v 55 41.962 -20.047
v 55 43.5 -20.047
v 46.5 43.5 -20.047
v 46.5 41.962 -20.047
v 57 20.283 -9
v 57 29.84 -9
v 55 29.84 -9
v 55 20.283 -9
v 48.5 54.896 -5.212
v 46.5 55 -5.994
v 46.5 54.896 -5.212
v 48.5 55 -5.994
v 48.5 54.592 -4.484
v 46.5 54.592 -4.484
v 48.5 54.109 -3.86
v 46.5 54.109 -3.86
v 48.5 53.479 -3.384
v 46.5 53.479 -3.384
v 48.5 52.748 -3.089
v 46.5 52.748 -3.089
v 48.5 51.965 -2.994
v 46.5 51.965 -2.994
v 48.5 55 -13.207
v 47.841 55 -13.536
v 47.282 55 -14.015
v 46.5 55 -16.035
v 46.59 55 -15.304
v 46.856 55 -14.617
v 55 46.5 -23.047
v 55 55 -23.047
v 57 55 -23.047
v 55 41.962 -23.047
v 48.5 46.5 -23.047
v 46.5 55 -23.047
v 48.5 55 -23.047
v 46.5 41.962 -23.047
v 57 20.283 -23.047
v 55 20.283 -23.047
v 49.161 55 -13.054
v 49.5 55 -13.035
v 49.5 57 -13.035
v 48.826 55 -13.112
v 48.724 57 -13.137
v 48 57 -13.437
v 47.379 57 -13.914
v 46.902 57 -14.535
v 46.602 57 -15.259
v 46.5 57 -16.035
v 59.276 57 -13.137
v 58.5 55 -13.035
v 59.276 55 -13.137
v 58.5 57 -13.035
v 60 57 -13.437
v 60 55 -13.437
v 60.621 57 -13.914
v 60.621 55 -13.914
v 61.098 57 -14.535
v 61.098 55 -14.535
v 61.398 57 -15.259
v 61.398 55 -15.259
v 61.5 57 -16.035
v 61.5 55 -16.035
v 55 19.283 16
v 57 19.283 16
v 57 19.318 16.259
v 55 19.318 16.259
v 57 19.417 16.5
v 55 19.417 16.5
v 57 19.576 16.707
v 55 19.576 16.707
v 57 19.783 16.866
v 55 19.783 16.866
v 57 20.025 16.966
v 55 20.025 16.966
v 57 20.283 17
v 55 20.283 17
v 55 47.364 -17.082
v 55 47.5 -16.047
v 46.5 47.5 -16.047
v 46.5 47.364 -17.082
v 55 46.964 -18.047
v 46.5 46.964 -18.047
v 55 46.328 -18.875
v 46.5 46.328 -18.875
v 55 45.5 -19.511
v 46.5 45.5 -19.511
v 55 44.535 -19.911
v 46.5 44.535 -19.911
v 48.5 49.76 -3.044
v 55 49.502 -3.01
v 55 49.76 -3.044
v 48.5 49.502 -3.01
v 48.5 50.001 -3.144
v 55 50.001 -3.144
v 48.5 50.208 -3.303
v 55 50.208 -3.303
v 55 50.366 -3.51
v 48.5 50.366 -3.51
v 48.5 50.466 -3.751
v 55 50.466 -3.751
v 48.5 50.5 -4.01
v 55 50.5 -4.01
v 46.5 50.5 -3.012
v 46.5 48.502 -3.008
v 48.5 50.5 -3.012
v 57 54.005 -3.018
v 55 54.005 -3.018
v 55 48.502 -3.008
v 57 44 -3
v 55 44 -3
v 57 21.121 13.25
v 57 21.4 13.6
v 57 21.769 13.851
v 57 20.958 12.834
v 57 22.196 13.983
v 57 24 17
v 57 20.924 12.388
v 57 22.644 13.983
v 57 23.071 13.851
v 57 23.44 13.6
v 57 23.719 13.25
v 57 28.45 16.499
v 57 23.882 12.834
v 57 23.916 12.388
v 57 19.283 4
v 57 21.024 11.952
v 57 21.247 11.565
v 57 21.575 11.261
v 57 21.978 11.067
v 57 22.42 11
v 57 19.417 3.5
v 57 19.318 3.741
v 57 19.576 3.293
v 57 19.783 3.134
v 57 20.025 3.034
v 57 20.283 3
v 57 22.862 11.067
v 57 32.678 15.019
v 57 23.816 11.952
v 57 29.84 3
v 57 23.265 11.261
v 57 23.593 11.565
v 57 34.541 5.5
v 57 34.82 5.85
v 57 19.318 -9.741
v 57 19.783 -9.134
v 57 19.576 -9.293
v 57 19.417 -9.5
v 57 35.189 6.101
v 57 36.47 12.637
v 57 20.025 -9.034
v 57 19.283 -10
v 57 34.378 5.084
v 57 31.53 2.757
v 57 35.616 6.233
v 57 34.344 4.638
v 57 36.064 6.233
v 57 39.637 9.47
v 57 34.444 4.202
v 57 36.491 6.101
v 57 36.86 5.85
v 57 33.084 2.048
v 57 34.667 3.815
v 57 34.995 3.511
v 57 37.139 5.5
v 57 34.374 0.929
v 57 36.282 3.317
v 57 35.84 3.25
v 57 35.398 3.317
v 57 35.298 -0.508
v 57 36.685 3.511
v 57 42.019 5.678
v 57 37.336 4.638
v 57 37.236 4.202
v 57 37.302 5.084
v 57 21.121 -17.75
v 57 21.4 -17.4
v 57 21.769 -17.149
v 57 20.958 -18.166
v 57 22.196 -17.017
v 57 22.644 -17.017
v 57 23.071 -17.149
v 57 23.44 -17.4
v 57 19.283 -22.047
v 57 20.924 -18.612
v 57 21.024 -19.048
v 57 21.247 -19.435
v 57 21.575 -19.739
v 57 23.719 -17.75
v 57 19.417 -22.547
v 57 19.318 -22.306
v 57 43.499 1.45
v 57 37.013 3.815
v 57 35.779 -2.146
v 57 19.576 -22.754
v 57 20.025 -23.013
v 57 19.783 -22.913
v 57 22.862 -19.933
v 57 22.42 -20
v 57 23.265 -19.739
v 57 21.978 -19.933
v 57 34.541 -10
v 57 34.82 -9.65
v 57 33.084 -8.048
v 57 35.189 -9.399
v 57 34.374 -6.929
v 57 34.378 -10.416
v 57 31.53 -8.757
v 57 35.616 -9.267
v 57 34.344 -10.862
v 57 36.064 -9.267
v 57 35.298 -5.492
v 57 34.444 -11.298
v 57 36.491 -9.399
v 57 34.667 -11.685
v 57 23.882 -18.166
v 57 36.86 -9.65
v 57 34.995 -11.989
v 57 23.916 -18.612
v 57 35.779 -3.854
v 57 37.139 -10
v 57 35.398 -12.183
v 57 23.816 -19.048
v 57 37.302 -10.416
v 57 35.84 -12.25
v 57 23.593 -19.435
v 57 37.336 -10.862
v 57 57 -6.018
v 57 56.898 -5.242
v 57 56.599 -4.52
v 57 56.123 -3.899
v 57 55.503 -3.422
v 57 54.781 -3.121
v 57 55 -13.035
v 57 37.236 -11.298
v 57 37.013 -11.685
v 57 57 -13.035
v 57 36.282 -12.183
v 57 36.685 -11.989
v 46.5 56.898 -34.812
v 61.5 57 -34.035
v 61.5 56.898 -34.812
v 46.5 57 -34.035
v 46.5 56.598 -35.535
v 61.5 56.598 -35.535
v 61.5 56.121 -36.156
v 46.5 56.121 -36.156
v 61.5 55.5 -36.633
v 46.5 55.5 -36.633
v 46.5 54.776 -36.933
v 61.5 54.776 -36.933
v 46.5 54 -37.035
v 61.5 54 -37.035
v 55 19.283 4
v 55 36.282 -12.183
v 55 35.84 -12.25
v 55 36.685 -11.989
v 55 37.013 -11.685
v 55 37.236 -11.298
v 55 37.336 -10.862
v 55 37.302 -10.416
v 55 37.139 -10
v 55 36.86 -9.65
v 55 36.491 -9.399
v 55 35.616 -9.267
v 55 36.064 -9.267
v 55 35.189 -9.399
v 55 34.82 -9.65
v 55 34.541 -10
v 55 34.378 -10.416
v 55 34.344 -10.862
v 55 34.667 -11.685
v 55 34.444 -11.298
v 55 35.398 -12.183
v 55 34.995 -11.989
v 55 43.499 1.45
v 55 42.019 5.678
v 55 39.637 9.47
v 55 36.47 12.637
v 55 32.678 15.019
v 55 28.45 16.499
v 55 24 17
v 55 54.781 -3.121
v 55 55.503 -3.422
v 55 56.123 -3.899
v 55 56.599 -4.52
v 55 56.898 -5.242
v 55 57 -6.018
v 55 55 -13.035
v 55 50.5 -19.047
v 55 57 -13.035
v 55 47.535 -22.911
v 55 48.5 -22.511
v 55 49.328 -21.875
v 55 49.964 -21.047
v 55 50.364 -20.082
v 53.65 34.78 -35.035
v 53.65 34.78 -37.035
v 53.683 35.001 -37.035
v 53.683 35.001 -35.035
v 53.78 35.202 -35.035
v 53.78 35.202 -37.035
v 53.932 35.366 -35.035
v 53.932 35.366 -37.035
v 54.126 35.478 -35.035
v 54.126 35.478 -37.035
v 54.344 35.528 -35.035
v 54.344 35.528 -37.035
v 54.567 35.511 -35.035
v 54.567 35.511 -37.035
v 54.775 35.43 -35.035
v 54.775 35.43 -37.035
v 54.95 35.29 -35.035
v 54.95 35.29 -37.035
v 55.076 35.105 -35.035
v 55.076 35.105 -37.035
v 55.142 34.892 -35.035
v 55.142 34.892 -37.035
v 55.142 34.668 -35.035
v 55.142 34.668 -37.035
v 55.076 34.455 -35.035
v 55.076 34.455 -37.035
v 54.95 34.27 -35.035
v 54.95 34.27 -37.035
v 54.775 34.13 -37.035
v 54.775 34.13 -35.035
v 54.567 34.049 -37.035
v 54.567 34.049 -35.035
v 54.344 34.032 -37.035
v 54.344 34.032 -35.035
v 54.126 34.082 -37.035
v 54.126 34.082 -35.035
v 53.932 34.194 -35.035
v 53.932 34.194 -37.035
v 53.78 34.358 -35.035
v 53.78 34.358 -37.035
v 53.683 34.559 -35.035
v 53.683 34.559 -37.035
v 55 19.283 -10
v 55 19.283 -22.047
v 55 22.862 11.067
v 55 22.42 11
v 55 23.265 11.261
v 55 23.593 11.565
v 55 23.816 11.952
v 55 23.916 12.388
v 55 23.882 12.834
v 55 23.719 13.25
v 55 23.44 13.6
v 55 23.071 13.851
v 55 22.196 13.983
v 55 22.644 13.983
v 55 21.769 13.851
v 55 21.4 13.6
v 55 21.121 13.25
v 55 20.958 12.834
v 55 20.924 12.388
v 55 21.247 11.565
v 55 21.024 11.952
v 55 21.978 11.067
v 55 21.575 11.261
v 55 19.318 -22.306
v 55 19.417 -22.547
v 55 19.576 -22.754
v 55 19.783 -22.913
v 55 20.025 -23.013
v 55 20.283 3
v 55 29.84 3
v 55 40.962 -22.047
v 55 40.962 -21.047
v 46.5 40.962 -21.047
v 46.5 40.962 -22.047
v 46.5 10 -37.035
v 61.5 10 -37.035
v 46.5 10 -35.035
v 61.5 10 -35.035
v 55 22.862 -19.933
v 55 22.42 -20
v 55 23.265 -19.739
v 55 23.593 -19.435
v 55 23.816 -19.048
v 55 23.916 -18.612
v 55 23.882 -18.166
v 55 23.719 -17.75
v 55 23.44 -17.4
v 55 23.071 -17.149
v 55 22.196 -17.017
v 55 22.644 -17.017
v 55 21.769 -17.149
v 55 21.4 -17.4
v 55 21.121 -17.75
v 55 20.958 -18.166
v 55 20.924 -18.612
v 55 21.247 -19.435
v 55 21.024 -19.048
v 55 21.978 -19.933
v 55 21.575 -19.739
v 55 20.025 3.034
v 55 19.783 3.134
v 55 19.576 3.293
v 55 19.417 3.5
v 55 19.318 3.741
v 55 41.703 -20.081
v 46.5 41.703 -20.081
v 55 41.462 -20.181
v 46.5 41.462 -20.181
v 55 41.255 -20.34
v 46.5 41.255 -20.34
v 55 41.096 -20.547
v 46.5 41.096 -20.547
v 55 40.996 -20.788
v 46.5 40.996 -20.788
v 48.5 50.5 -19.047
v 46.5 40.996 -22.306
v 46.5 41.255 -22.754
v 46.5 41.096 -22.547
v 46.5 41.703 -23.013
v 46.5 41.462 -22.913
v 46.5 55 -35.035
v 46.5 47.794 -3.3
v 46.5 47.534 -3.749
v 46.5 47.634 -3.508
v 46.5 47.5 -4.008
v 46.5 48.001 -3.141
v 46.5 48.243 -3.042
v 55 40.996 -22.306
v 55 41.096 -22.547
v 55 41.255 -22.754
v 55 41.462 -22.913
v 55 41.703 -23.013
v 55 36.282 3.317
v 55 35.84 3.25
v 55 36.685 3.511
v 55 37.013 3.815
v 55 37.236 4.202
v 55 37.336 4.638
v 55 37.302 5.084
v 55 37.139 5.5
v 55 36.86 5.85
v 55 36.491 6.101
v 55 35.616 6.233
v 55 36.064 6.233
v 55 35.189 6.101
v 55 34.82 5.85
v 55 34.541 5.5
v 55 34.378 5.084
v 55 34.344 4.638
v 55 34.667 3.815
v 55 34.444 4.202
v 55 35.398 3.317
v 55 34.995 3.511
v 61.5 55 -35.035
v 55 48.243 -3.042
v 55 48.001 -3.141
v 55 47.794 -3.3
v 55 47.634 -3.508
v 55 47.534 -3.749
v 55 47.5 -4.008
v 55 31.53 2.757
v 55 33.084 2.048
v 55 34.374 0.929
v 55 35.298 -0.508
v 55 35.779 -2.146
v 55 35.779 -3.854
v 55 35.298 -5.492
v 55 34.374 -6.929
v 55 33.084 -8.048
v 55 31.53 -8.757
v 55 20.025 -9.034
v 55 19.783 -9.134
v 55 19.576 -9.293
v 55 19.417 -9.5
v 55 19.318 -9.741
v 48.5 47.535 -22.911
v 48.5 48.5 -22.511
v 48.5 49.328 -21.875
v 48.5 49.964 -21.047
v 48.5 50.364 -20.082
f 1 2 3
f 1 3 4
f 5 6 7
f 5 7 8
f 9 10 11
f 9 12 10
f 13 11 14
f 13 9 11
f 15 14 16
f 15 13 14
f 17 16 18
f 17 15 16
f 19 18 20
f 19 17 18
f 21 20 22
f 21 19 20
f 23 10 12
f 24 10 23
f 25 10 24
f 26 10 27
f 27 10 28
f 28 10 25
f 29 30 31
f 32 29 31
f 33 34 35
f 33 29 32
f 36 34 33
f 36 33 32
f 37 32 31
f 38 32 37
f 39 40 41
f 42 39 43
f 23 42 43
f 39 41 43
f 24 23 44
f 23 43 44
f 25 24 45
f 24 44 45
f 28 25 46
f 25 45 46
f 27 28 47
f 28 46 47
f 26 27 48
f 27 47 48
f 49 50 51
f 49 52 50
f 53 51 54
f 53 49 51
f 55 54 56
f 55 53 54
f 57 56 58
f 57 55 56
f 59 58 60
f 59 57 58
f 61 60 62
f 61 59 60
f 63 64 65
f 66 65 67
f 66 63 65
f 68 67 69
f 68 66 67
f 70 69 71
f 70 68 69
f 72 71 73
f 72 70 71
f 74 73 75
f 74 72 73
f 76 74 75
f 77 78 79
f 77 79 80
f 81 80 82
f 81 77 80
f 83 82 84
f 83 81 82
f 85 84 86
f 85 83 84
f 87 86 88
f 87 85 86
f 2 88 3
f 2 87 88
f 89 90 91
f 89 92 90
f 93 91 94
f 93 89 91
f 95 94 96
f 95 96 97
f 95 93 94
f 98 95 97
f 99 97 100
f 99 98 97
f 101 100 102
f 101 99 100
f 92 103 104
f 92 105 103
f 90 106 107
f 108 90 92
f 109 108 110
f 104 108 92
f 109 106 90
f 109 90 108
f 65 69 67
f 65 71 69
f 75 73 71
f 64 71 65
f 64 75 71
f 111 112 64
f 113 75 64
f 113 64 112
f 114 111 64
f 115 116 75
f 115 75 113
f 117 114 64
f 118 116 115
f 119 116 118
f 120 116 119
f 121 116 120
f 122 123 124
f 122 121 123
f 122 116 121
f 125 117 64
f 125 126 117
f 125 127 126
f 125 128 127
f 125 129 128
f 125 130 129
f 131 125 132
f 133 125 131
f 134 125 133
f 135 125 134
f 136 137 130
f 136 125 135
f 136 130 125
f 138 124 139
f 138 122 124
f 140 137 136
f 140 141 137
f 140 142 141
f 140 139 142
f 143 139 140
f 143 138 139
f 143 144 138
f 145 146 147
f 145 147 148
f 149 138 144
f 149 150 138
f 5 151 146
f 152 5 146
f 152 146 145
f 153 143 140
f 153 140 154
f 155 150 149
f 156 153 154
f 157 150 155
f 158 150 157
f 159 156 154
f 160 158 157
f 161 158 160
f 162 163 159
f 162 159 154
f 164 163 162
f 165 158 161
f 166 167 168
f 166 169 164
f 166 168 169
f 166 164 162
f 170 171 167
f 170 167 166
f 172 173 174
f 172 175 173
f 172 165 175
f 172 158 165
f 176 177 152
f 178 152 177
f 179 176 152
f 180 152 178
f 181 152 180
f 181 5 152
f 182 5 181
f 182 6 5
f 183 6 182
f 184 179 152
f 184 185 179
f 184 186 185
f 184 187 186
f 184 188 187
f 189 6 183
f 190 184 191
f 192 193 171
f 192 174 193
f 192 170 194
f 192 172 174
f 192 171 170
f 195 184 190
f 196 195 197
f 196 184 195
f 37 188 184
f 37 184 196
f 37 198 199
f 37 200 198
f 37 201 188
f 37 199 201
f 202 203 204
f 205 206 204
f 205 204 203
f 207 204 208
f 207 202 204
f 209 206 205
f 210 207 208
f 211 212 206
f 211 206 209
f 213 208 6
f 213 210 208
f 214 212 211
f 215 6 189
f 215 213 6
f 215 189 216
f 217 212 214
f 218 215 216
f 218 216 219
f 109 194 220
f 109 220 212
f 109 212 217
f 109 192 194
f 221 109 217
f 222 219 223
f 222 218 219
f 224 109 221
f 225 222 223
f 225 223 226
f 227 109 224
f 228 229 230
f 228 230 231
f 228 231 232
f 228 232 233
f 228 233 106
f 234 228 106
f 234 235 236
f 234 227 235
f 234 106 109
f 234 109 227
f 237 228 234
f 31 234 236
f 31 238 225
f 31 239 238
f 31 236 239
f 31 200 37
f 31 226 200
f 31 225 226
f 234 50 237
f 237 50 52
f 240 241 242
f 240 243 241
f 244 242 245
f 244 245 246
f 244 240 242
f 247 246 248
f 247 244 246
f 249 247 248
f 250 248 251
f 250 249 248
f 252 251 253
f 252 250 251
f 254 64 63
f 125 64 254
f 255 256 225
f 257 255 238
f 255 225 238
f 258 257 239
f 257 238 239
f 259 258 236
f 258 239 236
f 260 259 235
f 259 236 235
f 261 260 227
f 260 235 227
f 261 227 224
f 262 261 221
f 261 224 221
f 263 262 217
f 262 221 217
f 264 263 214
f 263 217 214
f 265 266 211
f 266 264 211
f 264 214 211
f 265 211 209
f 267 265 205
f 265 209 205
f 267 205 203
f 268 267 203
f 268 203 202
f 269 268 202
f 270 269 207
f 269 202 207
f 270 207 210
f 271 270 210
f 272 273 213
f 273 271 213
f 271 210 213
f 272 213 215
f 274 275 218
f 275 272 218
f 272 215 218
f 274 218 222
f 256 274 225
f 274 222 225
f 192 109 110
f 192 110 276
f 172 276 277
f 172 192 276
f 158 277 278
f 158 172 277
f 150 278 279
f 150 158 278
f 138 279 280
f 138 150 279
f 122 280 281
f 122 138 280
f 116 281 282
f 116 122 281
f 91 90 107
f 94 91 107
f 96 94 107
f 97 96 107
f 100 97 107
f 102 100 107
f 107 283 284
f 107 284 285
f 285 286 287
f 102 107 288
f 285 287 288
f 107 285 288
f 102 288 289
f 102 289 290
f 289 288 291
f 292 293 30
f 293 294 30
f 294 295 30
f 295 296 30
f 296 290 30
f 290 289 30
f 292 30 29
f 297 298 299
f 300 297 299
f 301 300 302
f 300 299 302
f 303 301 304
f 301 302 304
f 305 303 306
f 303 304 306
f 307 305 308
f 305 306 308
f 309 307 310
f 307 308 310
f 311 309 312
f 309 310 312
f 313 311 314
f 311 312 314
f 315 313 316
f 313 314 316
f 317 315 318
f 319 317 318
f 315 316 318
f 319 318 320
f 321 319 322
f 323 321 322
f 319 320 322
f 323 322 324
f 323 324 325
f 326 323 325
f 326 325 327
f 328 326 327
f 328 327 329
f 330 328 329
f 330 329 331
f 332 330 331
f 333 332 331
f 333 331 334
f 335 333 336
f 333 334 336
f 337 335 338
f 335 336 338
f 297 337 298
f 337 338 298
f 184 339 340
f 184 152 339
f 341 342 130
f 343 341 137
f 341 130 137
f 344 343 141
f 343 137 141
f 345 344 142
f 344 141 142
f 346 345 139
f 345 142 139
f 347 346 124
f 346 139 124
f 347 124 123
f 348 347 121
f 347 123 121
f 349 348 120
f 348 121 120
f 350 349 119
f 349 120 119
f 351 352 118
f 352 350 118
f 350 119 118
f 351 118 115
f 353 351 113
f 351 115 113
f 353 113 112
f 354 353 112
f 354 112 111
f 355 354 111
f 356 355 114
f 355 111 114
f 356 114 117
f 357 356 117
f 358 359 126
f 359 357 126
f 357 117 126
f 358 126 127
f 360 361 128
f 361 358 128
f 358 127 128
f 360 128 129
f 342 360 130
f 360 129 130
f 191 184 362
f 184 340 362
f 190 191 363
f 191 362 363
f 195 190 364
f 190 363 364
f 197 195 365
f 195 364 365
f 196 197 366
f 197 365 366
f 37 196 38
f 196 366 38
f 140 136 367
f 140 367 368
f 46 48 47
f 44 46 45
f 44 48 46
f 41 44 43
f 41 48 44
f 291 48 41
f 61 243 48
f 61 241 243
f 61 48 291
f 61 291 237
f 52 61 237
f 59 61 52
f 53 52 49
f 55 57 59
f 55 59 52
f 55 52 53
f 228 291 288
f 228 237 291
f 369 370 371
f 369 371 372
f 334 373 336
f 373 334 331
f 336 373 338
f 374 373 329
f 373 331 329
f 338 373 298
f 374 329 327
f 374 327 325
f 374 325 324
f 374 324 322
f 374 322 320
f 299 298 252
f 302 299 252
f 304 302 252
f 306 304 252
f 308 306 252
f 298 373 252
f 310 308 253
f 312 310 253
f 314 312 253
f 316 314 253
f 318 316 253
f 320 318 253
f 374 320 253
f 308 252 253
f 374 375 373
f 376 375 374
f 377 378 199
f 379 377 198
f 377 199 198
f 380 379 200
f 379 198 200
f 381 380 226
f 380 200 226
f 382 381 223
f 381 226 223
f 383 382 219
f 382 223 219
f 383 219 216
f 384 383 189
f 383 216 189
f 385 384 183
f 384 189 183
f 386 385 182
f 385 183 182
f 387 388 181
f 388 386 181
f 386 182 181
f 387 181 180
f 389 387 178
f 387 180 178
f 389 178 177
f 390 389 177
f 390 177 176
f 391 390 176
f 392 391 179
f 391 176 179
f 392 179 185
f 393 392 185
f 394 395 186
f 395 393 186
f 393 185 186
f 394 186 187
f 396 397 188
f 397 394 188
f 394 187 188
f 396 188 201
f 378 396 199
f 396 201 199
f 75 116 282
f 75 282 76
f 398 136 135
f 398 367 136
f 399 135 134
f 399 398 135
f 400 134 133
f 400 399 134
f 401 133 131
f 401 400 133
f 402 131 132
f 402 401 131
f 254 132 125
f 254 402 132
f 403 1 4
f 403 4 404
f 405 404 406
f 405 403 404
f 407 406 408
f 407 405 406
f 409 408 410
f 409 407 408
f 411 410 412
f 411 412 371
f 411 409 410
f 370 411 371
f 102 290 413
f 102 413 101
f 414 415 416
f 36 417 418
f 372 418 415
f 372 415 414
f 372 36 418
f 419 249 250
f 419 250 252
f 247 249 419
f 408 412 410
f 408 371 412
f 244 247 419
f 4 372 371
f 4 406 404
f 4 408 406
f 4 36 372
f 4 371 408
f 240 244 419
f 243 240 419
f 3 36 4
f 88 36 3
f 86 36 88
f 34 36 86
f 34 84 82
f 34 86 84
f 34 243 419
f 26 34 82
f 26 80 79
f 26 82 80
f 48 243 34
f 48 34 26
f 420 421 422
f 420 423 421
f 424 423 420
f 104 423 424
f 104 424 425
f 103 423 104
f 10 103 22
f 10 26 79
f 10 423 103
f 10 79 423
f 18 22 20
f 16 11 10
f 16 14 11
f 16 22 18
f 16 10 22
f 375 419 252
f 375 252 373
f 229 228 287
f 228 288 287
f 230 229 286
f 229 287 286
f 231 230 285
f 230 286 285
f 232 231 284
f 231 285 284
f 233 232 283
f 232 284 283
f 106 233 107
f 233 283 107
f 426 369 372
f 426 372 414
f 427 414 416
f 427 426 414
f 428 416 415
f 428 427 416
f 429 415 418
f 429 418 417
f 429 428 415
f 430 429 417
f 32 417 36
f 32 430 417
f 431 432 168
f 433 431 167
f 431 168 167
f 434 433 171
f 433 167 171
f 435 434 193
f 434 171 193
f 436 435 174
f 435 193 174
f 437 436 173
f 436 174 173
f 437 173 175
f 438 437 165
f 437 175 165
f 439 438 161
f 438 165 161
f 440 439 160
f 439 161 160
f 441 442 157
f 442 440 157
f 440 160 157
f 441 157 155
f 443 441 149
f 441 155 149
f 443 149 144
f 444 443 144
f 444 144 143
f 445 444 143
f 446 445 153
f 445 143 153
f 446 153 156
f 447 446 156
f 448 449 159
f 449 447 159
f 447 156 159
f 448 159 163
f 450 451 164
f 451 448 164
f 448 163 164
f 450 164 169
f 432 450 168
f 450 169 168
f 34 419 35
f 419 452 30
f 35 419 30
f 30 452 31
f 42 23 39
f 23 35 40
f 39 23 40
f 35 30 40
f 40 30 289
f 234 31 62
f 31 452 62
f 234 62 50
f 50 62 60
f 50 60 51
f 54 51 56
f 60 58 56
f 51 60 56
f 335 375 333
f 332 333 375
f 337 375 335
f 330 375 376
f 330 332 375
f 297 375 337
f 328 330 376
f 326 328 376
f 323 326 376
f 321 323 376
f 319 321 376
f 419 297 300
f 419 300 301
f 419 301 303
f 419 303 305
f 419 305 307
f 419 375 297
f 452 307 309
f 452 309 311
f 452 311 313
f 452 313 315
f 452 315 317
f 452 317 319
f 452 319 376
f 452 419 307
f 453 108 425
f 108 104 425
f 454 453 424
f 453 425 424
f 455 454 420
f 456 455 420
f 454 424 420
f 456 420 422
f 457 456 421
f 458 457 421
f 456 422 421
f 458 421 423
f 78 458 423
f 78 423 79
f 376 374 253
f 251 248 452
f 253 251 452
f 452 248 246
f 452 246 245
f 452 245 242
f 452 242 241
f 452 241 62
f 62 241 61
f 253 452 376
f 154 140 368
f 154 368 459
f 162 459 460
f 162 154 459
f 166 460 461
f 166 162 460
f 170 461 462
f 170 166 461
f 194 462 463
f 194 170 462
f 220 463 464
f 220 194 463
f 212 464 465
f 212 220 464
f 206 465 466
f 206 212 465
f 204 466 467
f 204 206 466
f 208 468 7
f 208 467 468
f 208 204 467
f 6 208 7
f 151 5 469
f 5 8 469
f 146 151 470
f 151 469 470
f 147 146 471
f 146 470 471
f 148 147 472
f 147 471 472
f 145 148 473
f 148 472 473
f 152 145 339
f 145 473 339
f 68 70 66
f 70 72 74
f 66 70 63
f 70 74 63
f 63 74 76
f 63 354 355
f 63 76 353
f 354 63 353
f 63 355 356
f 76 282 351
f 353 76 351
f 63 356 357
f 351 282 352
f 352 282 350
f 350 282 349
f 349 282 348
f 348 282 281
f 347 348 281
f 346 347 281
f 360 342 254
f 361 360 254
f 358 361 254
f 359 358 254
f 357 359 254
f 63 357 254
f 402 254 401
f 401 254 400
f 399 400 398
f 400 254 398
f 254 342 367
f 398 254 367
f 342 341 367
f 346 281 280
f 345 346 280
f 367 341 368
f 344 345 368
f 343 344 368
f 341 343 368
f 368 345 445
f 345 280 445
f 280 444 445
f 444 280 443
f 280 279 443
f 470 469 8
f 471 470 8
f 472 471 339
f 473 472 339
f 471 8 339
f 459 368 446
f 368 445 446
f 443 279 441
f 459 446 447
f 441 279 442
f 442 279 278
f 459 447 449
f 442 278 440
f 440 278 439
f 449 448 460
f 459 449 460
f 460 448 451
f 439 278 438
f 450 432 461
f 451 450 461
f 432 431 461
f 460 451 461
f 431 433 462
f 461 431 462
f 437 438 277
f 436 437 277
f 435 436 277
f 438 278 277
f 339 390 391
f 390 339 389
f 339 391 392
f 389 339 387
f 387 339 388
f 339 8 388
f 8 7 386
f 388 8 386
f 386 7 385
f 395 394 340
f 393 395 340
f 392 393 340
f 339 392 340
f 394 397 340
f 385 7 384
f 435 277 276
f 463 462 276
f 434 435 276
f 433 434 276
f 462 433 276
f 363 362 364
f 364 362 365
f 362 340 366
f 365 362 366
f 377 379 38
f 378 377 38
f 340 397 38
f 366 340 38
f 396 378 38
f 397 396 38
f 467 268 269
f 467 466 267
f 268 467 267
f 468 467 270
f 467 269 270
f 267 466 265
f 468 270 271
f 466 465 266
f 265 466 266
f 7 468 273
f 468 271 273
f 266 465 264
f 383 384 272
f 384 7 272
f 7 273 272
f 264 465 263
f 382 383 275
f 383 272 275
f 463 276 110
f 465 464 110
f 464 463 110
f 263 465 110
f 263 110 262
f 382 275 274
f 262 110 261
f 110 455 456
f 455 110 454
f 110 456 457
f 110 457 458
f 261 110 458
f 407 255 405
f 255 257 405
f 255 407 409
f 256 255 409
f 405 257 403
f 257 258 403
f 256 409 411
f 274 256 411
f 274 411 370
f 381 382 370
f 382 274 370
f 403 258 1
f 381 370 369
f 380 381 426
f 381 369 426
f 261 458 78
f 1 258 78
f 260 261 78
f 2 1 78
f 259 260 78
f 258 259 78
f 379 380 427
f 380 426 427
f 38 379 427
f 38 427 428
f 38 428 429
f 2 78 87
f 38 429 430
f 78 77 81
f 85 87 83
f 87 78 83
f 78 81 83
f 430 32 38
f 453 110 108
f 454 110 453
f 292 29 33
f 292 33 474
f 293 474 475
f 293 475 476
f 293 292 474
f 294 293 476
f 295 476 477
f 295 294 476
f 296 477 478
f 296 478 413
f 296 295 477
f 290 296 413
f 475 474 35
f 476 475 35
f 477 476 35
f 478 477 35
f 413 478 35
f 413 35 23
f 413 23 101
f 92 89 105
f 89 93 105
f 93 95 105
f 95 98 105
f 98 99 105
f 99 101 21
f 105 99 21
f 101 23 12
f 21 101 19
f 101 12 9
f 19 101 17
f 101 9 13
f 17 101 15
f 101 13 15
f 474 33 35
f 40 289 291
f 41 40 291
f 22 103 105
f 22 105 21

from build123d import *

# Parameters (mm, degrees)
BOSS_EXTRUDE1_DEPTH      = 2
BOSS_EXTRUDE2_DEPTH      = 2
SKETCH3_R                = 6.000000000000001
CUT_EXTRUDE1_DEPTH       = 2
SKETCH4_R                = 1.5000000000000009
SKETCH4_R_2              = 1.5000000000000042
CUT_EXTRUDE2_DEPTH       = 3
SKETCH5_R                = 1.5000000000000004
SKETCH5_R_2              = 1.5000000000000042
CUT_EXTRUDE3_DEPTH       = 3
CUT_EXTRUDE4_DEPTH       = 3
CUT_EXTRUDE5_DEPTH       = 3
CUT_EXTRUDE6_DEPTH       = 3
SKETCH9_R                = 1.5000000000000042
CUT_EXTRUDE8_DEPTH       = 3
SKETCH10_R               = 1.5000000000000042
CUT_EXTRUDE9_DEPTH       = 3
CUT_EXTRUDE10_DEPTH      = 240.38671642344738
CUT_EXTRUDE10_DEPTH_BACK = 240.38671642344738
SKETCH12_R               = 1.4999999999999998
SKETCH12_R_2             = 1.5000000000000002
SKETCH12_R_3             = 1.5000000000000013
SKETCH12_R_4             = 1.5
SKETCH12_R_5             = 1.5000000000000009
BOSS_EXTRUDE7_START      = 2
SKETCH13_R               = 1.5000000000000009
SKETCH13_R_2             = 1.5000000000000024
BOSS_EXTRUDE7_DEPTH      = 2
BOSS_EXTRUDE8_START      = -6.5
SKETCH14_W               = 24
SKETCH14_H               = 2
BOSS_EXTRUDE8_DEPTH      = 15
SKETCH15_W               = 15.000000000000007
SKETCH15_H               = 2
BOSS_EXTRUDE9_DEPTH      = 45
CUT_EXTRUDE11_DEPTH      = 243.1136096959442
SKETCH17_W               = 185.56969898313426
SKETCH17_H               = 96.24266996951368
CUT_EXTRUDE13_DEPTH      = 211.18448651258493
SKETCH18_R               = 1.5000000000000042
CUT_EXTRUDE14_DEPTH      = 10
BOSS_EXTRUDE10_DEPTH     = 8.5
FILLET1_R                = 3
FILLET2_R                = 3
FILLET3_R                = 3
SKETCH21_W               = 15.000000000000007
SKETCH21_H               = 44.000000000000014
SKETCH21_R               = 0.7499999999999987
BOSS_EXTRUDE11_DEPTH     = 2
BOSS_EXTRUDE12_DEPTH     = 2
FILLET4_R                = 3
FILLET5_R                = 1
FILLET6_R                = 1


with BuildPart() as part:
    # Sketch1 → Boss-Extrude1 (new body)
    with BuildSketch(Plane(origin=(0, 0, 0), x_dir=(1, 0, 0), z_dir=(0, 1, 0))):
        Polygon((55, -26.999999999999986), (55, 27.00000000000001), (-55, 26.999999999999996), (-55, -27), (-38.49999999999998, -134.00000000000006), (38.50000000000002, -134.00000000000003), align=None)
        Polygon((64.00000000000001, -159.00000000000003), (-63.99999999999996, -159.00000000000003), (-63.999999999999986, -134.00000000000006), (64, -134.00000000000003), align=None)
        Polygon((31.00000000000004, -159.00000000000006), (-30.99999999999999, -159.00000000000006), (-30.999999999999982, -172.00000000000006), (31.000000000000018, -172.00000000000006), align=None)
        Polygon((64.00000000000006, -172.00000000000003), (-64, -172.00000000000006), (-63.999999999999986, -203), (64.00000000000001, -203.00000000000003), align=None)
    extrude(amount=BOSS_EXTRUDE1_DEPTH)

    # Sketch2 → Boss-Extrude2 (add)
    with BuildSketch(Plane.ZY.offset(55)):
        with BuildLine():
            ThreePointArc((-22.999999999999996, 24), (-2.999999999999998, 44), (16.999999999999996, 24))
            Line((16.999999999999996, 24), (-22.999999999999996, 24))
        make_face()
        Polygon((-22.999999999999996, 24), (-22.999999999999996, 2.000000000000001), (17.000000000000004, 2.0000000000000053), (17.000000000000004, 24), align=None)
    boss_extrude2 = extrude(amount=-BOSS_EXTRUDE2_DEPTH)

    # Sketch3 → Cut-Extrude1 (cut)
    with BuildSketch(Plane.ZY.offset(55)):
        with Locations((-2.9999999999999956, 16)):
            Circle(SKETCH3_R)
    cut_extrude1 = extrude(amount=-CUT_EXTRUDE1_DEPTH, mode=Mode.SUBTRACT)

    # Mirror1: Boss-Extrude2 across plane
    add(boss_extrude2.mirror(Plane(origin=(0, 0, 0), x_dir=(0, 0, 1), z_dir=(1, 0, 0))))

    # Mirror2: Cut-Extrude1 across plane
    add(cut_extrude1.mirror(Plane(origin=(0, 0, 0), x_dir=(0, 0, 1), z_dir=(1, 0, 0))), mode=Mode.SUBTRACT)

    # Sketch4 → Cut-Extrude2 (cut)
    with BuildSketch(Plane(origin=(0, 2, 0), x_dir=(1, 0, 0), z_dir=(0, 1, 0))):
        with Locations(Location((-31.999999999999993, -32.999999999999986, 0), (0, 0, 270))):
            Circle(SKETCH4_R)
        with Locations(Location((-31.999999999999993, -103.00000000000001, 0), (0, 0, 270))):
            Circle(SKETCH4_R)
        with Locations(Location((32.00000000000001, -103, 0), (0, 0, 270))):
            Circle(SKETCH4_R_2)
        with Locations(Location((32.00000000000001, -32.999999999999964, 0), (0, 0, 270))):
            Circle(SKETCH4_R_2)
    extrude(amount=-CUT_EXTRUDE2_DEPTH, mode=Mode.SUBTRACT)

    # Sketch5 → Cut-Extrude3 (cut)
    with BuildSketch(Plane(origin=(0, 2, 0), x_dir=(1, 0, 0), z_dir=(0, 1, 0))):
        with Locations(Location((0, -196, 0), (0, 0, 270))):
            Circle(SKETCH5_R)
        with Locations(Location((-42, -196, 0), (0, 0, 270))):
            Circle(SKETCH5_R_2)
        with Locations(Location((42, -195.99999999999997, 0), (0, 0, 270))):
            Circle(SKETCH5_R_2)
    extrude(amount=-CUT_EXTRUDE3_DEPTH, mode=Mode.SUBTRACT)

    # Sketch6 → Cut-Extrude4 (cut)
    with BuildSketch(Plane(origin=(0, 2, 0), x_dir=(1, 0, 0), z_dir=(0, 1, 0))):
        with BuildLine():
            Line((-39, -172.00000000000006), (-39, -178.99999999999997))
            ThreePointArc((-39, -178.99999999999997), (-41.92893218813453, -186.0710678118655), (-49.00000000000007, -189.00000000000003))
            Line((-49.00000000000007, -189.00000000000003), (-63.999999999999986, -189.00000000000003))
            Line((-63.999999999999986, -189.00000000000003), (-64, -172.00000000000009))
            Line((-64, -172.00000000000009), (-39, -172.00000000000006))
        make_face()
        with BuildLine():
            Line((64, -172.00000000000009), (39, -172.00000000000009))
            Line((39, -172.00000000000009), (39, -179))
            ThreePointArc((39, -179), (41.928932188134524, -186.07106781186553), (49.00000000000007, -189.00000000000003))
            Line((49.00000000000007, -189.00000000000003), (63.999999999999986, -189.00000000000003))
            Line((63.999999999999986, -189.00000000000003), (64, -172.00000000000009))
        make_face()
    extrude(amount=-CUT_EXTRUDE4_DEPTH, mode=Mode.SUBTRACT)

    # Sketch7 → Cut-Extrude5 (cut)
    with BuildSketch(Plane(origin=(0, 2, 0), x_dir=(1, 0, 0), z_dir=(0, 1, 0))):
        with BuildLine():
            Line((-63.999999999999986, -203), (-50.09999999999989, -203))
            ThreePointArc((-50.09999999999989, -203), (-59.92878425849301, -198.92878425849304), (-63.99999999999999, -189.0999999999999))
            Line((-63.999999999999986, -189.0999999999999), (-63.999999999999986, -203))
        make_face()
        with BuildLine():
            ThreePointArc((64.00000000000001, -189.09999999999988), (59.92878425849304, -198.928784258493), (50.099999999999916, -203))
            Line((50.099999999999916, -203), (64.00000000000001, -203))
            Line((64.00000000000001, -203), (64.00000000000001, -189.09999999999988))
        make_face()
    extrude(amount=-CUT_EXTRUDE5_DEPTH, mode=Mode.SUBTRACT)

    # Sketch8 → Cut-Extrude6 (cut)
    with BuildSketch(Plane(origin=(0, 2, 0), x_dir=(1, 0, 0), z_dir=(0, 1, 0))):
        with BuildLine():
            Line((-31.149343986878943, -172.00000000000006), (-39, -172.00000000000006))
            Line((-39, -172.00000000000006), (-38.99999999999999, -178.99999999999997))
            ThreePointArc((-39, -178.99999999999997), (-39.00000430772996, -179.009281949184), (-39.00001723091613, -179.01856389037115))
            ThreePointArc((-39.00001723091618, -179.01856389037115), (-36.414638600380236, -174.01046074526764), (-31.149343986878943, -172.00000000000006))
        make_face()
        with BuildLine():
            Line((39, -179), (39, -172.00000000000009))
            Line((39.00000000000004, -172), (31.149343986878986, -172))
            ThreePointArc((31.149343986878986, -172), (36.41463860038014, -174.01046074526744), (39.00001723091619, -179.01856389037067))
            ThreePointArc((39.00001723091614, -179.01856389037067), (39.000004307729974, -179.00928194918376), (39.000000000000014, -179))
        make_face()
    extrude(amount=-CUT_EXTRUDE6_DEPTH, mode=Mode.SUBTRACT)

    # Sketch9 → Cut-Extrude8 (cut)
    with BuildSketch(Plane(origin=(0, 2, 0), x_dir=(1, 0, 0), z_dir=(0, 1, 0))):
        with BuildLine():
            Line((-65.7442014947963, -159.00000000000003), (-38.49999999999998, -159.00000000000003))
            Line((-38.49999999999998, -159.00000000000003), (-58.499999999999986, -153.64101615137747))
            ThreePointArc((-58.499999999999986, -153.64101615137747), (-63.97949441454555, -146.5), (-58.49999999999998, -139.35898384862253))
            Line((-58.49999999999998, -139.3589838486225), (-38.49999999999998, -134.00000000000009))
            Line((-38.49999999999998, -134.00000000000009), (-65.7442014947963, -134.00000000000009))
            Line((-65.7442014947963, -134.00000000000009), (-65.7442014947963, -159.00000000000003))
        make_face()
        with BuildLine():
            Line((38.49999999999998, -159.00000000000003), (65.55068988792617, -159.00000000000003))
            Line((65.55068988792617, -159.00000000000003), (65.55068988792617, -134.00000000000009))
            Line((65.55068988792617, -134.00000000000009), (38.49999999999998, -134.00000000000009))
            Line((38.49999999999998, -134.00000000000009), (58.49999999999998, -139.3589838486225))
            ThreePointArc((58.49999999999998, -139.35898384862253), (63.97949441454555, -146.5), (58.499999999999986, -153.64101615137747))
            Line((58.499999999999986, -153.64101615137747), (38.49999999999998, -159.00000000000003))
        make_face()
        with Locations(Location((-58.97949441454556, -146.5, 0), (0, 0, 270))):
            Circle(SKETCH9_R)
        with Locations(Location((-43.97949441454556, -140.5, 0), (0, 0, 270))):
            Circle(SKETCH9_R)
        with Locations(Location((-43.979494414545556, -152.5, 0), (0, 0, 270))):
            Circle(SKETCH9_R)
        with Locations(Location((43.979494414545556, -152.5, 0), (0, 0, 270))):
            Circle(SKETCH9_R)
        with Locations(Location((43.97949441454556, -140.5, 0), (0, 0, 270))):
            Circle(SKETCH9_R)
        with Locations(Location((58.97949441454556, -146.5, 0), (0, 0, 270))):
            Circle(SKETCH9_R)
    extrude(amount=-CUT_EXTRUDE8_DEPTH, mode=Mode.SUBTRACT)

    # Sketch10 → Cut-Extrude9 (cut)
    with BuildSketch(Plane(origin=(0, 2, 0), x_dir=(1, 0, 0), z_dir=(0, 1, 0))):
        with Locations(Location((-13.999999999999984, -122.97951269366077, 0), (0, 0, 270))):
            Circle(SKETCH10_R)
        with Locations(Location((-13.99999999999998, -132.97951269366075, 0), (0, 0, 270))):
            Circle(SKETCH10_R)
        with Locations(Location((34.000000000000014, -122.97951269366077, 0), (0, 0, 270))):
            Circle(SKETCH10_R)
        with Locations(Location((34.000000000000014, -132.97951269366075, 0), (0, 0, 270))):
            Circle(SKETCH10_R)
    extrude(amount=-CUT_EXTRUDE9_DEPTH, mode=Mode.SUBTRACT)

    # Sketch12 → Cut-Extrude10 (cut, two sides: drawn at the far end of the back side and taken through both)
    with BuildSketch(Plane(origin=(55, 0, 0), x_dir=(0, 0, -1), z_dir=(1, 0, 0)).offset(-CUT_EXTRUDE10_DEPTH_BACK)):
        with Locations((-4.750000000000004, 9.000000000000002)):
            Circle(SKETCH12_R)
        with Locations((10.749999999999996, 9.000000000000007)):
            Circle(SKETCH12_R_2)
        with BuildLine():
            ThreePointArc((8.999999999999975, 29.840000000000014), (2.9999999999999827, 35.83999999999998), (-3.000000000000003, 29.840000000000007))
            Line((-3.000000000000004, 29.840000000000007), (-3.0000000000000053, 16))
            ThreePointArc((-3.000000000000004, 16), (2.9999999999999964, 10), (8.999999999999998, 16))
            Line((8.999999999999998, 16), (8.999999999999973, 29.840000000000014))
        make_face()
        with Locations((-4.750000000000004, 35.84)):
            Circle(SKETCH12_R_3)
        with Locations((10.749999999999996, 35.84000000000001)):
            Circle(SKETCH12_R_4)
        with Locations((-12.500000000000004, 22.42)):
            Circle(SKETCH12_R_5)
        with Locations((18.499999999999996, 22.42000000000001)):
            Circle(SKETCH12_R_5)
    extrude(amount=CUT_EXTRUDE10_DEPTH + CUT_EXTRUDE10_DEPTH_BACK, mode=Mode.SUBTRACT)

    # Sketch13 → Boss-Extrude7 (add)
    # profile 1 of 2: a face of its own
    with BuildSketch(Plane(origin=(55, 0, 0), x_dir=(0, 0, -1), z_dir=(1, 0, 0)).offset(BOSS_EXTRUDE7_START)):
        with BuildLine():
            Line((-17.000000000000004, 24), (-17.000000000000004, 19.28348423041724))
            Line((-17.000000000000004, 19.28348423041724), (-3.0000000000000053, 19.28348423041724))
            Line((-3.000000000000005, 19.28348423041724), (-3.000000000000004, 29.840000000000007))
            ThreePointArc((-3.000000000000006, 29.840000000000007), (2.9999999999999787, 35.84), (8.999999999999972, 29.840000000000014))
            Line((8.999999999999973, 29.840000000000014), (8.999999999999993, 19.28348423041724))
            Line((8.999999999999993, 19.28348423041724), (22.999999999999996, 19.283484230417237))
            Line((22.999999999999996, 19.283484230417237), (22.999999999999996, 24))
            ThreePointArc((22.999999999999996, 24), (17.142135623730947, 38.14213562373095), (2.999999999999998, 44))
            ThreePointArc((2.999999999999998, 44), (-11.142135623730953, 38.14213562373095), (-17.000000000000004, 24.000000000000004))
        make_face()
        with Locations((-12.500000000000004, 22.42)):
            Circle(SKETCH13_R, mode=Mode.SUBTRACT)
        with Locations((18.499999999999996, 22.42000000000001)):
            Circle(SKETCH13_R, mode=Mode.SUBTRACT)
        with Locations((-4.750000000000004, 35.84)):
            Circle(SKETCH13_R, mode=Mode.SUBTRACT)
        with Locations((10.749999999999996, 35.84000000000001)):
            Circle(SKETCH13_R_2, mode=Mode.SUBTRACT)
    # profile 2 of 2: a face of its own
    with BuildSketch(Plane(origin=(55, 0, 0), x_dir=(0, 0, -1), z_dir=(1, 0, 0)).offset(BOSS_EXTRUDE7_START)):
        with BuildLine():
            Line((22.999999999999996, 24), (22.999999999999996, 19.283484230417237))
            Line((22.999999999999996, 19.283484230417237), (23.046815154055327, 19.283484230417237))
            Line((23.046815154055327, 19.283484230417237), (23.04681515405532, 57))
            Line((23.04681515405532, 57), (3.0234075770276583, 57))
            Line((3.023407577027657, 57), (2.999999999999997, 44))
            ThreePointArc((2.999999999999998, 44), (17.142135623730947, 38.14213562373095), (22.999999999999996, 24))
        make_face()
    extrude(amount=-BOSS_EXTRUDE7_DEPTH)

    # Sketch14 → Boss-Extrude8 (add)
    with BuildSketch(Plane.ZY.offset(-55).offset(BOSS_EXTRUDE8_START)):
        with Locations((-25.03511136554149, 56.00000000000001)):
            Rectangle(SKETCH14_W, SKETCH14_H)
    extrude(amount=BOSS_EXTRUDE8_DEPTH)

    # Sketch15 → Boss-Extrude9 (add)
    with BuildSketch(Plane.XZ.offset(-55)):
        with Locations((54, -36.03511136554149)):
            Rectangle(SKETCH15_W, SKETCH15_H)
    extrude(amount=BOSS_EXTRUDE9_DEPTH)

    # Sketch16 → Cut-Extrude11 (cut, through all)
    with BuildSketch(Plane.ZY.offset(-55)):
        Polygon((-35.92021187003197, 46.46920068706199), (-36.717575013579555, -14.58603430458196), (219.6312484084681, -17.93387341643705), (219.6312484084681, 46.469200687062), align=None)
    extrude(amount=CUT_EXTRUDE11_DEPTH, mode=Mode.SUBTRACT)


with BuildPart() as cut_extrude11_piece_1:
    # of the separate pieces the step leaves, piece 1, a body of its own (cut_extrude11_pieces)
    add(part.part.solids().sort_by_distance((57, 19.28348423, -9))[0])

    # Sketch18 → Cut-Extrude14 (cut)
    with BuildSketch(Plane(origin=(0, 0, -37.03511136554149), x_dir=(-1, 0, 0), z_dir=(0, 0, -1))):
        with Locations((-54.4, 34.78000000000001)):
            Circle(SKETCH18_R)
    extrude(amount=-CUT_EXTRUDE14_DEPTH, mode=Mode.SUBTRACT)

    # Sketch19 → Boss-Extrude10 (add)
    with BuildSketch(Plane.ZY.offset(-55)):
        with BuildLine():
            Line((-3.0117037885138274, 50.5), (-3.006302039968982, 47.5))
            Line((-3.006302039968982, 47.5), (-16.04681515405532, 47.50000000000001))
            ThreePointArc((-16.04681515405532, 47.50000000000001), (-18.875242278801508, 46.32842712474619), (-20.04681515405532, 43.5))
            Line((-20.04681515405532, 43.5), (-20.04681515405532, 41.96229343982267))
            ThreePointArc((-20.04681515405532, 41.96229343982267), (-20.339708372868774, 41.25518665863612), (-21.046815154055327, 40.962293439822666))
            Line((-21.046815154055327, 40.962293439822666), (-22.046815154055313, 40.962293439822666))
            ThreePointArc((-22.046815154055313, 40.962293439822666), (-22.75392193524187, 41.25518665863611), (-23.046815154055324, 41.96229343982267))
            Line((-23.046815154055324, 41.96229343982267), (-23.046815154055317, 46.5))
            ThreePointArc((-23.046815154055317, 46.5), (-21.875242278801515, 49.3284271247462), (-19.04681515405532, 50.50000000000001))
            Line((-19.04681515405532, 50.50000000000001), (-3.0117037885138274, 50.5))
        make_face()
    extrude(amount=BOSS_EXTRUDE10_DEPTH)

    # Fillet1
    fillet1_edges = [cut_extrude11_piece_1.edges().sort_by_distance(p)[0] for p in [
        (56, 57, -3.0234075770276574),
    ]]
    fillet(fillet1_edges, radius=FILLET1_R)

    # Fillet2
    fillet2_edges = [cut_extrude11_piece_1.edges().sort_by_distance(p)[0] for p in [
        (61.5, 56, -13.035111365541487),
        (46.5, 56, -13.035111365541487),
    ]]
    fillet(fillet2_edges, radius=FILLET2_R)

    # Fillet3
    fillet3_edges = [cut_extrude11_piece_1.edges().sort_by_distance(p)[0] for p in [
        (54, 57.00000000000001, -37.03511136554149),
    ]]
    fillet(fillet3_edges, radius=FILLET3_R)

    # Sketch21 → Boss-Extrude11 (add)
    with BuildSketch(Plane(origin=(0, 0, -37.03511136554149), x_dir=(-1, 0, 0), z_dir=(0, 0, -1))):
        with Locations((-54, 32)):
            Rectangle(SKETCH21_W, SKETCH21_H)
        with Locations((-54.4, 34.78000000000001)):
            Circle(SKETCH21_R, mode=Mode.SUBTRACT)
    extrude(amount=-BOSS_EXTRUDE11_DEPTH)

    # Sketch22 → Boss-Extrude12 (add)
    with BuildSketch(Plane.ZY.offset(-46.5)):
        with BuildLine():
            Line((-16.035111365541486, 55), (-23.04681515405532, 55))
            Line((-23.04681515405532, 55), (-23.046815154055324, 46.5))
            ThreePointArc((-23.046815154055317, 46.5), (-21.875242278801515, 49.3284271247462), (-19.04681515405532, 50.50000000000001))
            Line((-19.04681515405532, 50.50000000000001), (-3.0117037885138274, 50.5))
            Line((-3.0117037885138274, 50.5), (-2.958554912067868, 55))
            Line((-2.958554912067868, 55), (-16.035111365541486, 55))
        make_face()
    extrude(amount=-BOSS_EXTRUDE12_DEPTH)

    # Fillet4
    fillet4_edges = [cut_extrude11_piece_1.edges().sort_by_distance(p)[0] for p in [
        (47.5, 55, -2.958554912067868),
    ]]
    fillet(fillet4_edges, radius=FILLET4_R)

    # Fillet5
    fillet5_edges = [cut_extrude11_piece_1.edges().sort_by_distance(p)[0] for p in [
        (51.75, 50.5, -3.0117037885138274),
        (50.75, 47.5, -3.006302039968982),
    ]]
    fillet(fillet5_edges, radius=FILLET5_R)

    # Fillet6
    fillet6_edges = [cut_extrude11_piece_1.edges().sort_by_distance(p)[0] for p in [
        (56, 19.283484230417237, -23.046815154055327),
        (56, 19.28348423041724, -8.999999999999993),
        (56, 19.28348423041724, 17.000000000000004),
        (56, 19.28348423041724, 3.0000000000000053),
    ]]
    fillet(fillet6_edges, radius=FILLET6_R)


with BuildPart() as cut_extrude11_piece_2:
    # of the separate pieces the step leaves, piece 2, a body of its own (cut_extrude11_pieces)
    add(part.part.solids().sort_by_distance((55, 0, 138.421161675))[0])


with BuildPart() as cut_extrude11_piece_3:
    # of the separate pieces the step leaves, piece 3, a body of its own (cut_extrude11_pieces)
    add(part.part.solids().sort_by_distance((55, 0, 189))[0])


with BuildPart() as cut_extrude13_tool:
    # Sketch17 → Cut-Extrude13 (new, through all)
    with BuildSketch(Plane.ZY.offset(-55)):
        with Locations((121.69980384064316, 40.02606825982201)):
            Rectangle(SKETCH17_W, SKETCH17_H)
    extrude(amount=-CUT_EXTRUDE13_DEPTH)


with BuildPart() as cut_extrude11_piece_2_1:
    add(cut_extrude11_piece_2.part)

    # Cut-Extrude13: cut by cut_extrude13_tool
    add(cut_extrude13_tool.part, mode=Mode.SUBTRACT)


with BuildPart() as cut_extrude11_piece_3_1:
    add(cut_extrude11_piece_3.part)

    # Cut-Extrude13: cut by cut_extrude13_tool
    add(cut_extrude13_tool.part, mode=Mode.SUBTRACT)


solid = cut_extrude11_piece_1.part
